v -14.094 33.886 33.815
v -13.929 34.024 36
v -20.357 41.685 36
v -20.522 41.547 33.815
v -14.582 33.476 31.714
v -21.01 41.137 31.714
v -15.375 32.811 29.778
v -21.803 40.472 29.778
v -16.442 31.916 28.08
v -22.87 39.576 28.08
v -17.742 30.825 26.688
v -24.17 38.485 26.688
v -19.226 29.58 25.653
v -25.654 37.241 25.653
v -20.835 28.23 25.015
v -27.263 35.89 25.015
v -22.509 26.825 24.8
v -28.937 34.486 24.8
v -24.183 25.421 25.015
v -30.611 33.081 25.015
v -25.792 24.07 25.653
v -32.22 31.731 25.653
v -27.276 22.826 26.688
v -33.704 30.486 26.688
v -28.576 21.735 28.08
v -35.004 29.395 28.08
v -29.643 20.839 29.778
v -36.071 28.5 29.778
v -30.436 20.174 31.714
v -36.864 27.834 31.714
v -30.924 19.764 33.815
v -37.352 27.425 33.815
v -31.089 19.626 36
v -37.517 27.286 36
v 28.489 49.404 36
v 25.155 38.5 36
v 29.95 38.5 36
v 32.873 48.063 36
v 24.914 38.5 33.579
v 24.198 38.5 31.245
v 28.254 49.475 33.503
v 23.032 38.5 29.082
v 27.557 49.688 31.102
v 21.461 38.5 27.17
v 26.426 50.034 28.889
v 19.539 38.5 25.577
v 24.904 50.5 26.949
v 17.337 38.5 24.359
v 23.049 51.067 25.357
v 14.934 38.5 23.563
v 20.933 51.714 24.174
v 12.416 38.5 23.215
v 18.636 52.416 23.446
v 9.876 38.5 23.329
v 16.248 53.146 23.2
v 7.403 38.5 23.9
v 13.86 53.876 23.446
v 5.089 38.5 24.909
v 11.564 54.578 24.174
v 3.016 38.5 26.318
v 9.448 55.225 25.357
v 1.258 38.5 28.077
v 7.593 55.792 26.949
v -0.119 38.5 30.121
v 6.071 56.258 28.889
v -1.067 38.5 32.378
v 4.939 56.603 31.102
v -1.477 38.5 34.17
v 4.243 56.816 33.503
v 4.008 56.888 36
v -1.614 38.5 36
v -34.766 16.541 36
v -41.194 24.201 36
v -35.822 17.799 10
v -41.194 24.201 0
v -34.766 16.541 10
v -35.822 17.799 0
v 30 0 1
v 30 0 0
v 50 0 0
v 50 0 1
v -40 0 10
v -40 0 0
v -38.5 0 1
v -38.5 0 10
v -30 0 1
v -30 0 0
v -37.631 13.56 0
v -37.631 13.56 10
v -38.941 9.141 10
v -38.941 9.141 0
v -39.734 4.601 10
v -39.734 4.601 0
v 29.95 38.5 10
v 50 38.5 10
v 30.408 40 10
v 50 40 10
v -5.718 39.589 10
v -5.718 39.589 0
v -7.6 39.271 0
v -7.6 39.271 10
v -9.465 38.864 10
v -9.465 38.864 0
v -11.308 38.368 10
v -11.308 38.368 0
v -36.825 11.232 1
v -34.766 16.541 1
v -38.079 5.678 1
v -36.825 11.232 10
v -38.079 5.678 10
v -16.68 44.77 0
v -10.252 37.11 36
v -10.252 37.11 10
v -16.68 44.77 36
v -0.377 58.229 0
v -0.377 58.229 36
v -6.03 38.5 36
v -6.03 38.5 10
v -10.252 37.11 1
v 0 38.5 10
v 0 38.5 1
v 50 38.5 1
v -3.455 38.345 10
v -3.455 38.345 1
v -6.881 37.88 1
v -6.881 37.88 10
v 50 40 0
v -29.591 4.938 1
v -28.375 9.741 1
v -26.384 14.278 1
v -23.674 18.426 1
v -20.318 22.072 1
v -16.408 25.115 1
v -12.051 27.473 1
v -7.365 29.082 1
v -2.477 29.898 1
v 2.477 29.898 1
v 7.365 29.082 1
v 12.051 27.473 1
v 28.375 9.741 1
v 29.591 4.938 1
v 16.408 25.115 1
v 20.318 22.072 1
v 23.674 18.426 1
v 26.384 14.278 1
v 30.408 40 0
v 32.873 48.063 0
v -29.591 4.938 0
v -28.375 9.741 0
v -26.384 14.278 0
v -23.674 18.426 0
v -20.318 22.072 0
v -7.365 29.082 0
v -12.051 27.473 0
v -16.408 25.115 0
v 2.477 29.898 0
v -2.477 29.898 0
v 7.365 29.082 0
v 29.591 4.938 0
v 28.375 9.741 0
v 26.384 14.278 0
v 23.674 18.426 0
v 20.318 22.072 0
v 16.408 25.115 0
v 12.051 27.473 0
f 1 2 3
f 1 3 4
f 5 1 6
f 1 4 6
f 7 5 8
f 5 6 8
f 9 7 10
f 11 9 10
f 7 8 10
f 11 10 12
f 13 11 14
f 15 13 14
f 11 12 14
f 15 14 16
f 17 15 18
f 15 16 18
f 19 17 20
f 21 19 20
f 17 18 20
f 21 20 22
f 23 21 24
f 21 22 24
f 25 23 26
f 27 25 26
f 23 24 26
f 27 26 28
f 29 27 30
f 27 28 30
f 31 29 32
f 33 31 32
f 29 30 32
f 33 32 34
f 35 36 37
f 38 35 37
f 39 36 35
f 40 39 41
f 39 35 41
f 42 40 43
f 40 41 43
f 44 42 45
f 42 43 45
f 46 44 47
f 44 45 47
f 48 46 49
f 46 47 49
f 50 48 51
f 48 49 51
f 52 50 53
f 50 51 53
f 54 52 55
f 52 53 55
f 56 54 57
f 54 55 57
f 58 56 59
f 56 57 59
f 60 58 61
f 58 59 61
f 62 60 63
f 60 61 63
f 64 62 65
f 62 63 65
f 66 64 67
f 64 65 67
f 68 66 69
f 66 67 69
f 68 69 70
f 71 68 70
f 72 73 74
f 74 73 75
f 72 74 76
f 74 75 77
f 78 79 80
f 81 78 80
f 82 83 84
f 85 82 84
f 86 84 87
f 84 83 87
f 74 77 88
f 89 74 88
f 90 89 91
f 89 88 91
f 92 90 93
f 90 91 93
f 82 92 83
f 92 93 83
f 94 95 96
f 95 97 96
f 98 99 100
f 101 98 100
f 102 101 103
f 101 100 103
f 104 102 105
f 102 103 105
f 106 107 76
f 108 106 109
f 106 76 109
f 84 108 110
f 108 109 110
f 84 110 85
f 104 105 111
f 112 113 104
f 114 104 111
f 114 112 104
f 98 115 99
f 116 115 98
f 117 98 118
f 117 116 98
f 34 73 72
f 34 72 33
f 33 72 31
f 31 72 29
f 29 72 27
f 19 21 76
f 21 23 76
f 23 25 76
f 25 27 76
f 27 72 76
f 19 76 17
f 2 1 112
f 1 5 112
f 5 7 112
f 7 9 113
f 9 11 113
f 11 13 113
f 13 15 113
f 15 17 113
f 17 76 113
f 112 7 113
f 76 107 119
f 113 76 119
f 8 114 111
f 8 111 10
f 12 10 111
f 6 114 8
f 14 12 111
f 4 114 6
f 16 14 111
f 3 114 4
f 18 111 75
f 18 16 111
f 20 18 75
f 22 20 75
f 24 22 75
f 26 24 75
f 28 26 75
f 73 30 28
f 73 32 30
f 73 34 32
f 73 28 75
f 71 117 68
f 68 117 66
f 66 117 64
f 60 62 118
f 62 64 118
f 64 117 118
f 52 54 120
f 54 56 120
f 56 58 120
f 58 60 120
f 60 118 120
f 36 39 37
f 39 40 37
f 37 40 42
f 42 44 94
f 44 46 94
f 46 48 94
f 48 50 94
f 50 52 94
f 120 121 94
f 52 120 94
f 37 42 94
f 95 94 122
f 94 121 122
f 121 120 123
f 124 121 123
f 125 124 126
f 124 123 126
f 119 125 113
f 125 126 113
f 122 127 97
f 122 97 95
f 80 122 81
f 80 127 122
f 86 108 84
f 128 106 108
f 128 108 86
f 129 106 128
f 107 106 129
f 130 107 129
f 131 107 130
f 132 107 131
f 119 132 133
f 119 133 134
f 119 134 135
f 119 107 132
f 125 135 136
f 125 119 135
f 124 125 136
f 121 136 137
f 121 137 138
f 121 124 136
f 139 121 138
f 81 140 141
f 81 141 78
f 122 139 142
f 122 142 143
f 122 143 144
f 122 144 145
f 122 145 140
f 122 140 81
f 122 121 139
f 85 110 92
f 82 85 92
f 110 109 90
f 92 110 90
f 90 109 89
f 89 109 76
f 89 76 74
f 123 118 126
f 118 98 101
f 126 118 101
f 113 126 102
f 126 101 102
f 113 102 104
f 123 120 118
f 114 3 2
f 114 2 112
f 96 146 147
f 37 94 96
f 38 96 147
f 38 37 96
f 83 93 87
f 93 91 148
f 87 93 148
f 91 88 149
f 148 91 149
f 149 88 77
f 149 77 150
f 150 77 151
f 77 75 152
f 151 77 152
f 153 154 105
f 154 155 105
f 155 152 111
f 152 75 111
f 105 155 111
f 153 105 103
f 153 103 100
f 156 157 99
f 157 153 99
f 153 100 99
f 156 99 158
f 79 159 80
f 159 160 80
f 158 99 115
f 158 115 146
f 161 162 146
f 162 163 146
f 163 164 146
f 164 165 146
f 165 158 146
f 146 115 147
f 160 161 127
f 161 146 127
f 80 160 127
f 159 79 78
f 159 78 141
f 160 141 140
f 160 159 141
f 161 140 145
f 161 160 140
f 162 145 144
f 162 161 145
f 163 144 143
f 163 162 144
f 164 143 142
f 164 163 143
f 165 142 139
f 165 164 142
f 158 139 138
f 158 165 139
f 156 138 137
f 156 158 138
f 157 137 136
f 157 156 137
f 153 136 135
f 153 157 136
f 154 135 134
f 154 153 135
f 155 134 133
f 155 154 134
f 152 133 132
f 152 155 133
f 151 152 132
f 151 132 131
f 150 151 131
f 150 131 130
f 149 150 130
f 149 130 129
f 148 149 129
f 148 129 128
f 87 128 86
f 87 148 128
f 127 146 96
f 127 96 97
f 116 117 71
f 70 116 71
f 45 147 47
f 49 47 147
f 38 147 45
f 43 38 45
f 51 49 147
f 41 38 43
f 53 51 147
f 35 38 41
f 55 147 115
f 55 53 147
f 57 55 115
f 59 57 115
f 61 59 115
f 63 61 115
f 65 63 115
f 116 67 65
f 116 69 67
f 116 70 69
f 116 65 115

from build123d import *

# Parameters (mm, degrees)
PAD_DEPTH         = 10
POCKET_DEPTH      = 9
PAD001_DEPTH      = 35
PAD001_DEPTH_BACK = 1
SKETCH007_R       = 12.8
POCKET001_DEPTH   = 67.6190458501
SKETCH004_R       = 11.2
POCKET002_DEPTH   = 77.1582330742


with BuildPart() as part:
    # Sketch → Pad (new body)
    with BuildSketch(Plane.XY):
        with BuildLine():
            ThreePointArc((30, 0), (0, 30), (-30, 0))
            Line((-40, 0), (-30, 0))
            ThreePointArc((0, 40), (-28.2842712475, 28.2842712475), (-40, 0))
            Line((0, 40), (50, 40))
            Line((50, 40), (50, 0))
            Line((30, 0), (50, 0))
        make_face()
    extrude(amount=PAD_DEPTH)

    # Sketch002 → Pocket (cut)
    with BuildSketch(Plane.XY.offset(10)):
        with BuildLine():
            ThreePointArc((0, 38.5), (-27.2236110757, 27.2236110757), (-38.5, 0))
            Line((65, -6.5), (-38.5, 0))
            Line((65, 38.5), (65, -6.5))
            Line((0, 38.5), (65, 38.5))
        make_face()
    extrude(amount=-POCKET_DEPTH, mode=Mode.SUBTRACT)

    # Sketch003 → Pad001 (new body, two sides)
    with BuildSketch(Plane.XY.offset(1)) as pad001_sk:
        Polygon((-0.3768292053, 58.2286851346), (-6.0296340472, 38.5), (29.9497560282, 38.5), (32.8734730754, 48.0630475596), align=None)
        Polygon((-16.6802067695, 44.7702775725), (-41.1936289493, 24.2010740626), (-34.7657528524, 16.5406296314), (-10.2523306726, 37.1098331414), align=None)
    extrude(amount=PAD001_DEPTH)
    extrude(pad001_sk.sketch, amount=-PAD001_DEPTH_BACK)

    # Sketch007 → Pocket001 (cut, through all)
    with BuildSketch(Plane(origin=(16.248321935, 53.1458663471, 0), x_dir=(-0.956304756, 0.2923717047, 0), z_dir=(0.2923717047, 0.956304756, 0))):
        with Locations((0, 36)):
            Circle(SKETCH007_R)
    extrude(amount=-POCKET001_DEPTH, mode=Mode.SUBTRACT)

    # Sketch004 → Pocket002 (cut, through all)
    with BuildSketch(Plane(origin=(-28.9369178594, 34.4856758176, 0), x_dir=(-0.7660444431, -0.6427876097, 0), z_dir=(-0.6427876097, 0.7660444431, 0))):
        with Locations((0, 36)):
            Circle(SKETCH004_R)
    extrude(amount=-POCKET002_DEPTH, mode=Mode.SUBTRACT)


solid = part.part
